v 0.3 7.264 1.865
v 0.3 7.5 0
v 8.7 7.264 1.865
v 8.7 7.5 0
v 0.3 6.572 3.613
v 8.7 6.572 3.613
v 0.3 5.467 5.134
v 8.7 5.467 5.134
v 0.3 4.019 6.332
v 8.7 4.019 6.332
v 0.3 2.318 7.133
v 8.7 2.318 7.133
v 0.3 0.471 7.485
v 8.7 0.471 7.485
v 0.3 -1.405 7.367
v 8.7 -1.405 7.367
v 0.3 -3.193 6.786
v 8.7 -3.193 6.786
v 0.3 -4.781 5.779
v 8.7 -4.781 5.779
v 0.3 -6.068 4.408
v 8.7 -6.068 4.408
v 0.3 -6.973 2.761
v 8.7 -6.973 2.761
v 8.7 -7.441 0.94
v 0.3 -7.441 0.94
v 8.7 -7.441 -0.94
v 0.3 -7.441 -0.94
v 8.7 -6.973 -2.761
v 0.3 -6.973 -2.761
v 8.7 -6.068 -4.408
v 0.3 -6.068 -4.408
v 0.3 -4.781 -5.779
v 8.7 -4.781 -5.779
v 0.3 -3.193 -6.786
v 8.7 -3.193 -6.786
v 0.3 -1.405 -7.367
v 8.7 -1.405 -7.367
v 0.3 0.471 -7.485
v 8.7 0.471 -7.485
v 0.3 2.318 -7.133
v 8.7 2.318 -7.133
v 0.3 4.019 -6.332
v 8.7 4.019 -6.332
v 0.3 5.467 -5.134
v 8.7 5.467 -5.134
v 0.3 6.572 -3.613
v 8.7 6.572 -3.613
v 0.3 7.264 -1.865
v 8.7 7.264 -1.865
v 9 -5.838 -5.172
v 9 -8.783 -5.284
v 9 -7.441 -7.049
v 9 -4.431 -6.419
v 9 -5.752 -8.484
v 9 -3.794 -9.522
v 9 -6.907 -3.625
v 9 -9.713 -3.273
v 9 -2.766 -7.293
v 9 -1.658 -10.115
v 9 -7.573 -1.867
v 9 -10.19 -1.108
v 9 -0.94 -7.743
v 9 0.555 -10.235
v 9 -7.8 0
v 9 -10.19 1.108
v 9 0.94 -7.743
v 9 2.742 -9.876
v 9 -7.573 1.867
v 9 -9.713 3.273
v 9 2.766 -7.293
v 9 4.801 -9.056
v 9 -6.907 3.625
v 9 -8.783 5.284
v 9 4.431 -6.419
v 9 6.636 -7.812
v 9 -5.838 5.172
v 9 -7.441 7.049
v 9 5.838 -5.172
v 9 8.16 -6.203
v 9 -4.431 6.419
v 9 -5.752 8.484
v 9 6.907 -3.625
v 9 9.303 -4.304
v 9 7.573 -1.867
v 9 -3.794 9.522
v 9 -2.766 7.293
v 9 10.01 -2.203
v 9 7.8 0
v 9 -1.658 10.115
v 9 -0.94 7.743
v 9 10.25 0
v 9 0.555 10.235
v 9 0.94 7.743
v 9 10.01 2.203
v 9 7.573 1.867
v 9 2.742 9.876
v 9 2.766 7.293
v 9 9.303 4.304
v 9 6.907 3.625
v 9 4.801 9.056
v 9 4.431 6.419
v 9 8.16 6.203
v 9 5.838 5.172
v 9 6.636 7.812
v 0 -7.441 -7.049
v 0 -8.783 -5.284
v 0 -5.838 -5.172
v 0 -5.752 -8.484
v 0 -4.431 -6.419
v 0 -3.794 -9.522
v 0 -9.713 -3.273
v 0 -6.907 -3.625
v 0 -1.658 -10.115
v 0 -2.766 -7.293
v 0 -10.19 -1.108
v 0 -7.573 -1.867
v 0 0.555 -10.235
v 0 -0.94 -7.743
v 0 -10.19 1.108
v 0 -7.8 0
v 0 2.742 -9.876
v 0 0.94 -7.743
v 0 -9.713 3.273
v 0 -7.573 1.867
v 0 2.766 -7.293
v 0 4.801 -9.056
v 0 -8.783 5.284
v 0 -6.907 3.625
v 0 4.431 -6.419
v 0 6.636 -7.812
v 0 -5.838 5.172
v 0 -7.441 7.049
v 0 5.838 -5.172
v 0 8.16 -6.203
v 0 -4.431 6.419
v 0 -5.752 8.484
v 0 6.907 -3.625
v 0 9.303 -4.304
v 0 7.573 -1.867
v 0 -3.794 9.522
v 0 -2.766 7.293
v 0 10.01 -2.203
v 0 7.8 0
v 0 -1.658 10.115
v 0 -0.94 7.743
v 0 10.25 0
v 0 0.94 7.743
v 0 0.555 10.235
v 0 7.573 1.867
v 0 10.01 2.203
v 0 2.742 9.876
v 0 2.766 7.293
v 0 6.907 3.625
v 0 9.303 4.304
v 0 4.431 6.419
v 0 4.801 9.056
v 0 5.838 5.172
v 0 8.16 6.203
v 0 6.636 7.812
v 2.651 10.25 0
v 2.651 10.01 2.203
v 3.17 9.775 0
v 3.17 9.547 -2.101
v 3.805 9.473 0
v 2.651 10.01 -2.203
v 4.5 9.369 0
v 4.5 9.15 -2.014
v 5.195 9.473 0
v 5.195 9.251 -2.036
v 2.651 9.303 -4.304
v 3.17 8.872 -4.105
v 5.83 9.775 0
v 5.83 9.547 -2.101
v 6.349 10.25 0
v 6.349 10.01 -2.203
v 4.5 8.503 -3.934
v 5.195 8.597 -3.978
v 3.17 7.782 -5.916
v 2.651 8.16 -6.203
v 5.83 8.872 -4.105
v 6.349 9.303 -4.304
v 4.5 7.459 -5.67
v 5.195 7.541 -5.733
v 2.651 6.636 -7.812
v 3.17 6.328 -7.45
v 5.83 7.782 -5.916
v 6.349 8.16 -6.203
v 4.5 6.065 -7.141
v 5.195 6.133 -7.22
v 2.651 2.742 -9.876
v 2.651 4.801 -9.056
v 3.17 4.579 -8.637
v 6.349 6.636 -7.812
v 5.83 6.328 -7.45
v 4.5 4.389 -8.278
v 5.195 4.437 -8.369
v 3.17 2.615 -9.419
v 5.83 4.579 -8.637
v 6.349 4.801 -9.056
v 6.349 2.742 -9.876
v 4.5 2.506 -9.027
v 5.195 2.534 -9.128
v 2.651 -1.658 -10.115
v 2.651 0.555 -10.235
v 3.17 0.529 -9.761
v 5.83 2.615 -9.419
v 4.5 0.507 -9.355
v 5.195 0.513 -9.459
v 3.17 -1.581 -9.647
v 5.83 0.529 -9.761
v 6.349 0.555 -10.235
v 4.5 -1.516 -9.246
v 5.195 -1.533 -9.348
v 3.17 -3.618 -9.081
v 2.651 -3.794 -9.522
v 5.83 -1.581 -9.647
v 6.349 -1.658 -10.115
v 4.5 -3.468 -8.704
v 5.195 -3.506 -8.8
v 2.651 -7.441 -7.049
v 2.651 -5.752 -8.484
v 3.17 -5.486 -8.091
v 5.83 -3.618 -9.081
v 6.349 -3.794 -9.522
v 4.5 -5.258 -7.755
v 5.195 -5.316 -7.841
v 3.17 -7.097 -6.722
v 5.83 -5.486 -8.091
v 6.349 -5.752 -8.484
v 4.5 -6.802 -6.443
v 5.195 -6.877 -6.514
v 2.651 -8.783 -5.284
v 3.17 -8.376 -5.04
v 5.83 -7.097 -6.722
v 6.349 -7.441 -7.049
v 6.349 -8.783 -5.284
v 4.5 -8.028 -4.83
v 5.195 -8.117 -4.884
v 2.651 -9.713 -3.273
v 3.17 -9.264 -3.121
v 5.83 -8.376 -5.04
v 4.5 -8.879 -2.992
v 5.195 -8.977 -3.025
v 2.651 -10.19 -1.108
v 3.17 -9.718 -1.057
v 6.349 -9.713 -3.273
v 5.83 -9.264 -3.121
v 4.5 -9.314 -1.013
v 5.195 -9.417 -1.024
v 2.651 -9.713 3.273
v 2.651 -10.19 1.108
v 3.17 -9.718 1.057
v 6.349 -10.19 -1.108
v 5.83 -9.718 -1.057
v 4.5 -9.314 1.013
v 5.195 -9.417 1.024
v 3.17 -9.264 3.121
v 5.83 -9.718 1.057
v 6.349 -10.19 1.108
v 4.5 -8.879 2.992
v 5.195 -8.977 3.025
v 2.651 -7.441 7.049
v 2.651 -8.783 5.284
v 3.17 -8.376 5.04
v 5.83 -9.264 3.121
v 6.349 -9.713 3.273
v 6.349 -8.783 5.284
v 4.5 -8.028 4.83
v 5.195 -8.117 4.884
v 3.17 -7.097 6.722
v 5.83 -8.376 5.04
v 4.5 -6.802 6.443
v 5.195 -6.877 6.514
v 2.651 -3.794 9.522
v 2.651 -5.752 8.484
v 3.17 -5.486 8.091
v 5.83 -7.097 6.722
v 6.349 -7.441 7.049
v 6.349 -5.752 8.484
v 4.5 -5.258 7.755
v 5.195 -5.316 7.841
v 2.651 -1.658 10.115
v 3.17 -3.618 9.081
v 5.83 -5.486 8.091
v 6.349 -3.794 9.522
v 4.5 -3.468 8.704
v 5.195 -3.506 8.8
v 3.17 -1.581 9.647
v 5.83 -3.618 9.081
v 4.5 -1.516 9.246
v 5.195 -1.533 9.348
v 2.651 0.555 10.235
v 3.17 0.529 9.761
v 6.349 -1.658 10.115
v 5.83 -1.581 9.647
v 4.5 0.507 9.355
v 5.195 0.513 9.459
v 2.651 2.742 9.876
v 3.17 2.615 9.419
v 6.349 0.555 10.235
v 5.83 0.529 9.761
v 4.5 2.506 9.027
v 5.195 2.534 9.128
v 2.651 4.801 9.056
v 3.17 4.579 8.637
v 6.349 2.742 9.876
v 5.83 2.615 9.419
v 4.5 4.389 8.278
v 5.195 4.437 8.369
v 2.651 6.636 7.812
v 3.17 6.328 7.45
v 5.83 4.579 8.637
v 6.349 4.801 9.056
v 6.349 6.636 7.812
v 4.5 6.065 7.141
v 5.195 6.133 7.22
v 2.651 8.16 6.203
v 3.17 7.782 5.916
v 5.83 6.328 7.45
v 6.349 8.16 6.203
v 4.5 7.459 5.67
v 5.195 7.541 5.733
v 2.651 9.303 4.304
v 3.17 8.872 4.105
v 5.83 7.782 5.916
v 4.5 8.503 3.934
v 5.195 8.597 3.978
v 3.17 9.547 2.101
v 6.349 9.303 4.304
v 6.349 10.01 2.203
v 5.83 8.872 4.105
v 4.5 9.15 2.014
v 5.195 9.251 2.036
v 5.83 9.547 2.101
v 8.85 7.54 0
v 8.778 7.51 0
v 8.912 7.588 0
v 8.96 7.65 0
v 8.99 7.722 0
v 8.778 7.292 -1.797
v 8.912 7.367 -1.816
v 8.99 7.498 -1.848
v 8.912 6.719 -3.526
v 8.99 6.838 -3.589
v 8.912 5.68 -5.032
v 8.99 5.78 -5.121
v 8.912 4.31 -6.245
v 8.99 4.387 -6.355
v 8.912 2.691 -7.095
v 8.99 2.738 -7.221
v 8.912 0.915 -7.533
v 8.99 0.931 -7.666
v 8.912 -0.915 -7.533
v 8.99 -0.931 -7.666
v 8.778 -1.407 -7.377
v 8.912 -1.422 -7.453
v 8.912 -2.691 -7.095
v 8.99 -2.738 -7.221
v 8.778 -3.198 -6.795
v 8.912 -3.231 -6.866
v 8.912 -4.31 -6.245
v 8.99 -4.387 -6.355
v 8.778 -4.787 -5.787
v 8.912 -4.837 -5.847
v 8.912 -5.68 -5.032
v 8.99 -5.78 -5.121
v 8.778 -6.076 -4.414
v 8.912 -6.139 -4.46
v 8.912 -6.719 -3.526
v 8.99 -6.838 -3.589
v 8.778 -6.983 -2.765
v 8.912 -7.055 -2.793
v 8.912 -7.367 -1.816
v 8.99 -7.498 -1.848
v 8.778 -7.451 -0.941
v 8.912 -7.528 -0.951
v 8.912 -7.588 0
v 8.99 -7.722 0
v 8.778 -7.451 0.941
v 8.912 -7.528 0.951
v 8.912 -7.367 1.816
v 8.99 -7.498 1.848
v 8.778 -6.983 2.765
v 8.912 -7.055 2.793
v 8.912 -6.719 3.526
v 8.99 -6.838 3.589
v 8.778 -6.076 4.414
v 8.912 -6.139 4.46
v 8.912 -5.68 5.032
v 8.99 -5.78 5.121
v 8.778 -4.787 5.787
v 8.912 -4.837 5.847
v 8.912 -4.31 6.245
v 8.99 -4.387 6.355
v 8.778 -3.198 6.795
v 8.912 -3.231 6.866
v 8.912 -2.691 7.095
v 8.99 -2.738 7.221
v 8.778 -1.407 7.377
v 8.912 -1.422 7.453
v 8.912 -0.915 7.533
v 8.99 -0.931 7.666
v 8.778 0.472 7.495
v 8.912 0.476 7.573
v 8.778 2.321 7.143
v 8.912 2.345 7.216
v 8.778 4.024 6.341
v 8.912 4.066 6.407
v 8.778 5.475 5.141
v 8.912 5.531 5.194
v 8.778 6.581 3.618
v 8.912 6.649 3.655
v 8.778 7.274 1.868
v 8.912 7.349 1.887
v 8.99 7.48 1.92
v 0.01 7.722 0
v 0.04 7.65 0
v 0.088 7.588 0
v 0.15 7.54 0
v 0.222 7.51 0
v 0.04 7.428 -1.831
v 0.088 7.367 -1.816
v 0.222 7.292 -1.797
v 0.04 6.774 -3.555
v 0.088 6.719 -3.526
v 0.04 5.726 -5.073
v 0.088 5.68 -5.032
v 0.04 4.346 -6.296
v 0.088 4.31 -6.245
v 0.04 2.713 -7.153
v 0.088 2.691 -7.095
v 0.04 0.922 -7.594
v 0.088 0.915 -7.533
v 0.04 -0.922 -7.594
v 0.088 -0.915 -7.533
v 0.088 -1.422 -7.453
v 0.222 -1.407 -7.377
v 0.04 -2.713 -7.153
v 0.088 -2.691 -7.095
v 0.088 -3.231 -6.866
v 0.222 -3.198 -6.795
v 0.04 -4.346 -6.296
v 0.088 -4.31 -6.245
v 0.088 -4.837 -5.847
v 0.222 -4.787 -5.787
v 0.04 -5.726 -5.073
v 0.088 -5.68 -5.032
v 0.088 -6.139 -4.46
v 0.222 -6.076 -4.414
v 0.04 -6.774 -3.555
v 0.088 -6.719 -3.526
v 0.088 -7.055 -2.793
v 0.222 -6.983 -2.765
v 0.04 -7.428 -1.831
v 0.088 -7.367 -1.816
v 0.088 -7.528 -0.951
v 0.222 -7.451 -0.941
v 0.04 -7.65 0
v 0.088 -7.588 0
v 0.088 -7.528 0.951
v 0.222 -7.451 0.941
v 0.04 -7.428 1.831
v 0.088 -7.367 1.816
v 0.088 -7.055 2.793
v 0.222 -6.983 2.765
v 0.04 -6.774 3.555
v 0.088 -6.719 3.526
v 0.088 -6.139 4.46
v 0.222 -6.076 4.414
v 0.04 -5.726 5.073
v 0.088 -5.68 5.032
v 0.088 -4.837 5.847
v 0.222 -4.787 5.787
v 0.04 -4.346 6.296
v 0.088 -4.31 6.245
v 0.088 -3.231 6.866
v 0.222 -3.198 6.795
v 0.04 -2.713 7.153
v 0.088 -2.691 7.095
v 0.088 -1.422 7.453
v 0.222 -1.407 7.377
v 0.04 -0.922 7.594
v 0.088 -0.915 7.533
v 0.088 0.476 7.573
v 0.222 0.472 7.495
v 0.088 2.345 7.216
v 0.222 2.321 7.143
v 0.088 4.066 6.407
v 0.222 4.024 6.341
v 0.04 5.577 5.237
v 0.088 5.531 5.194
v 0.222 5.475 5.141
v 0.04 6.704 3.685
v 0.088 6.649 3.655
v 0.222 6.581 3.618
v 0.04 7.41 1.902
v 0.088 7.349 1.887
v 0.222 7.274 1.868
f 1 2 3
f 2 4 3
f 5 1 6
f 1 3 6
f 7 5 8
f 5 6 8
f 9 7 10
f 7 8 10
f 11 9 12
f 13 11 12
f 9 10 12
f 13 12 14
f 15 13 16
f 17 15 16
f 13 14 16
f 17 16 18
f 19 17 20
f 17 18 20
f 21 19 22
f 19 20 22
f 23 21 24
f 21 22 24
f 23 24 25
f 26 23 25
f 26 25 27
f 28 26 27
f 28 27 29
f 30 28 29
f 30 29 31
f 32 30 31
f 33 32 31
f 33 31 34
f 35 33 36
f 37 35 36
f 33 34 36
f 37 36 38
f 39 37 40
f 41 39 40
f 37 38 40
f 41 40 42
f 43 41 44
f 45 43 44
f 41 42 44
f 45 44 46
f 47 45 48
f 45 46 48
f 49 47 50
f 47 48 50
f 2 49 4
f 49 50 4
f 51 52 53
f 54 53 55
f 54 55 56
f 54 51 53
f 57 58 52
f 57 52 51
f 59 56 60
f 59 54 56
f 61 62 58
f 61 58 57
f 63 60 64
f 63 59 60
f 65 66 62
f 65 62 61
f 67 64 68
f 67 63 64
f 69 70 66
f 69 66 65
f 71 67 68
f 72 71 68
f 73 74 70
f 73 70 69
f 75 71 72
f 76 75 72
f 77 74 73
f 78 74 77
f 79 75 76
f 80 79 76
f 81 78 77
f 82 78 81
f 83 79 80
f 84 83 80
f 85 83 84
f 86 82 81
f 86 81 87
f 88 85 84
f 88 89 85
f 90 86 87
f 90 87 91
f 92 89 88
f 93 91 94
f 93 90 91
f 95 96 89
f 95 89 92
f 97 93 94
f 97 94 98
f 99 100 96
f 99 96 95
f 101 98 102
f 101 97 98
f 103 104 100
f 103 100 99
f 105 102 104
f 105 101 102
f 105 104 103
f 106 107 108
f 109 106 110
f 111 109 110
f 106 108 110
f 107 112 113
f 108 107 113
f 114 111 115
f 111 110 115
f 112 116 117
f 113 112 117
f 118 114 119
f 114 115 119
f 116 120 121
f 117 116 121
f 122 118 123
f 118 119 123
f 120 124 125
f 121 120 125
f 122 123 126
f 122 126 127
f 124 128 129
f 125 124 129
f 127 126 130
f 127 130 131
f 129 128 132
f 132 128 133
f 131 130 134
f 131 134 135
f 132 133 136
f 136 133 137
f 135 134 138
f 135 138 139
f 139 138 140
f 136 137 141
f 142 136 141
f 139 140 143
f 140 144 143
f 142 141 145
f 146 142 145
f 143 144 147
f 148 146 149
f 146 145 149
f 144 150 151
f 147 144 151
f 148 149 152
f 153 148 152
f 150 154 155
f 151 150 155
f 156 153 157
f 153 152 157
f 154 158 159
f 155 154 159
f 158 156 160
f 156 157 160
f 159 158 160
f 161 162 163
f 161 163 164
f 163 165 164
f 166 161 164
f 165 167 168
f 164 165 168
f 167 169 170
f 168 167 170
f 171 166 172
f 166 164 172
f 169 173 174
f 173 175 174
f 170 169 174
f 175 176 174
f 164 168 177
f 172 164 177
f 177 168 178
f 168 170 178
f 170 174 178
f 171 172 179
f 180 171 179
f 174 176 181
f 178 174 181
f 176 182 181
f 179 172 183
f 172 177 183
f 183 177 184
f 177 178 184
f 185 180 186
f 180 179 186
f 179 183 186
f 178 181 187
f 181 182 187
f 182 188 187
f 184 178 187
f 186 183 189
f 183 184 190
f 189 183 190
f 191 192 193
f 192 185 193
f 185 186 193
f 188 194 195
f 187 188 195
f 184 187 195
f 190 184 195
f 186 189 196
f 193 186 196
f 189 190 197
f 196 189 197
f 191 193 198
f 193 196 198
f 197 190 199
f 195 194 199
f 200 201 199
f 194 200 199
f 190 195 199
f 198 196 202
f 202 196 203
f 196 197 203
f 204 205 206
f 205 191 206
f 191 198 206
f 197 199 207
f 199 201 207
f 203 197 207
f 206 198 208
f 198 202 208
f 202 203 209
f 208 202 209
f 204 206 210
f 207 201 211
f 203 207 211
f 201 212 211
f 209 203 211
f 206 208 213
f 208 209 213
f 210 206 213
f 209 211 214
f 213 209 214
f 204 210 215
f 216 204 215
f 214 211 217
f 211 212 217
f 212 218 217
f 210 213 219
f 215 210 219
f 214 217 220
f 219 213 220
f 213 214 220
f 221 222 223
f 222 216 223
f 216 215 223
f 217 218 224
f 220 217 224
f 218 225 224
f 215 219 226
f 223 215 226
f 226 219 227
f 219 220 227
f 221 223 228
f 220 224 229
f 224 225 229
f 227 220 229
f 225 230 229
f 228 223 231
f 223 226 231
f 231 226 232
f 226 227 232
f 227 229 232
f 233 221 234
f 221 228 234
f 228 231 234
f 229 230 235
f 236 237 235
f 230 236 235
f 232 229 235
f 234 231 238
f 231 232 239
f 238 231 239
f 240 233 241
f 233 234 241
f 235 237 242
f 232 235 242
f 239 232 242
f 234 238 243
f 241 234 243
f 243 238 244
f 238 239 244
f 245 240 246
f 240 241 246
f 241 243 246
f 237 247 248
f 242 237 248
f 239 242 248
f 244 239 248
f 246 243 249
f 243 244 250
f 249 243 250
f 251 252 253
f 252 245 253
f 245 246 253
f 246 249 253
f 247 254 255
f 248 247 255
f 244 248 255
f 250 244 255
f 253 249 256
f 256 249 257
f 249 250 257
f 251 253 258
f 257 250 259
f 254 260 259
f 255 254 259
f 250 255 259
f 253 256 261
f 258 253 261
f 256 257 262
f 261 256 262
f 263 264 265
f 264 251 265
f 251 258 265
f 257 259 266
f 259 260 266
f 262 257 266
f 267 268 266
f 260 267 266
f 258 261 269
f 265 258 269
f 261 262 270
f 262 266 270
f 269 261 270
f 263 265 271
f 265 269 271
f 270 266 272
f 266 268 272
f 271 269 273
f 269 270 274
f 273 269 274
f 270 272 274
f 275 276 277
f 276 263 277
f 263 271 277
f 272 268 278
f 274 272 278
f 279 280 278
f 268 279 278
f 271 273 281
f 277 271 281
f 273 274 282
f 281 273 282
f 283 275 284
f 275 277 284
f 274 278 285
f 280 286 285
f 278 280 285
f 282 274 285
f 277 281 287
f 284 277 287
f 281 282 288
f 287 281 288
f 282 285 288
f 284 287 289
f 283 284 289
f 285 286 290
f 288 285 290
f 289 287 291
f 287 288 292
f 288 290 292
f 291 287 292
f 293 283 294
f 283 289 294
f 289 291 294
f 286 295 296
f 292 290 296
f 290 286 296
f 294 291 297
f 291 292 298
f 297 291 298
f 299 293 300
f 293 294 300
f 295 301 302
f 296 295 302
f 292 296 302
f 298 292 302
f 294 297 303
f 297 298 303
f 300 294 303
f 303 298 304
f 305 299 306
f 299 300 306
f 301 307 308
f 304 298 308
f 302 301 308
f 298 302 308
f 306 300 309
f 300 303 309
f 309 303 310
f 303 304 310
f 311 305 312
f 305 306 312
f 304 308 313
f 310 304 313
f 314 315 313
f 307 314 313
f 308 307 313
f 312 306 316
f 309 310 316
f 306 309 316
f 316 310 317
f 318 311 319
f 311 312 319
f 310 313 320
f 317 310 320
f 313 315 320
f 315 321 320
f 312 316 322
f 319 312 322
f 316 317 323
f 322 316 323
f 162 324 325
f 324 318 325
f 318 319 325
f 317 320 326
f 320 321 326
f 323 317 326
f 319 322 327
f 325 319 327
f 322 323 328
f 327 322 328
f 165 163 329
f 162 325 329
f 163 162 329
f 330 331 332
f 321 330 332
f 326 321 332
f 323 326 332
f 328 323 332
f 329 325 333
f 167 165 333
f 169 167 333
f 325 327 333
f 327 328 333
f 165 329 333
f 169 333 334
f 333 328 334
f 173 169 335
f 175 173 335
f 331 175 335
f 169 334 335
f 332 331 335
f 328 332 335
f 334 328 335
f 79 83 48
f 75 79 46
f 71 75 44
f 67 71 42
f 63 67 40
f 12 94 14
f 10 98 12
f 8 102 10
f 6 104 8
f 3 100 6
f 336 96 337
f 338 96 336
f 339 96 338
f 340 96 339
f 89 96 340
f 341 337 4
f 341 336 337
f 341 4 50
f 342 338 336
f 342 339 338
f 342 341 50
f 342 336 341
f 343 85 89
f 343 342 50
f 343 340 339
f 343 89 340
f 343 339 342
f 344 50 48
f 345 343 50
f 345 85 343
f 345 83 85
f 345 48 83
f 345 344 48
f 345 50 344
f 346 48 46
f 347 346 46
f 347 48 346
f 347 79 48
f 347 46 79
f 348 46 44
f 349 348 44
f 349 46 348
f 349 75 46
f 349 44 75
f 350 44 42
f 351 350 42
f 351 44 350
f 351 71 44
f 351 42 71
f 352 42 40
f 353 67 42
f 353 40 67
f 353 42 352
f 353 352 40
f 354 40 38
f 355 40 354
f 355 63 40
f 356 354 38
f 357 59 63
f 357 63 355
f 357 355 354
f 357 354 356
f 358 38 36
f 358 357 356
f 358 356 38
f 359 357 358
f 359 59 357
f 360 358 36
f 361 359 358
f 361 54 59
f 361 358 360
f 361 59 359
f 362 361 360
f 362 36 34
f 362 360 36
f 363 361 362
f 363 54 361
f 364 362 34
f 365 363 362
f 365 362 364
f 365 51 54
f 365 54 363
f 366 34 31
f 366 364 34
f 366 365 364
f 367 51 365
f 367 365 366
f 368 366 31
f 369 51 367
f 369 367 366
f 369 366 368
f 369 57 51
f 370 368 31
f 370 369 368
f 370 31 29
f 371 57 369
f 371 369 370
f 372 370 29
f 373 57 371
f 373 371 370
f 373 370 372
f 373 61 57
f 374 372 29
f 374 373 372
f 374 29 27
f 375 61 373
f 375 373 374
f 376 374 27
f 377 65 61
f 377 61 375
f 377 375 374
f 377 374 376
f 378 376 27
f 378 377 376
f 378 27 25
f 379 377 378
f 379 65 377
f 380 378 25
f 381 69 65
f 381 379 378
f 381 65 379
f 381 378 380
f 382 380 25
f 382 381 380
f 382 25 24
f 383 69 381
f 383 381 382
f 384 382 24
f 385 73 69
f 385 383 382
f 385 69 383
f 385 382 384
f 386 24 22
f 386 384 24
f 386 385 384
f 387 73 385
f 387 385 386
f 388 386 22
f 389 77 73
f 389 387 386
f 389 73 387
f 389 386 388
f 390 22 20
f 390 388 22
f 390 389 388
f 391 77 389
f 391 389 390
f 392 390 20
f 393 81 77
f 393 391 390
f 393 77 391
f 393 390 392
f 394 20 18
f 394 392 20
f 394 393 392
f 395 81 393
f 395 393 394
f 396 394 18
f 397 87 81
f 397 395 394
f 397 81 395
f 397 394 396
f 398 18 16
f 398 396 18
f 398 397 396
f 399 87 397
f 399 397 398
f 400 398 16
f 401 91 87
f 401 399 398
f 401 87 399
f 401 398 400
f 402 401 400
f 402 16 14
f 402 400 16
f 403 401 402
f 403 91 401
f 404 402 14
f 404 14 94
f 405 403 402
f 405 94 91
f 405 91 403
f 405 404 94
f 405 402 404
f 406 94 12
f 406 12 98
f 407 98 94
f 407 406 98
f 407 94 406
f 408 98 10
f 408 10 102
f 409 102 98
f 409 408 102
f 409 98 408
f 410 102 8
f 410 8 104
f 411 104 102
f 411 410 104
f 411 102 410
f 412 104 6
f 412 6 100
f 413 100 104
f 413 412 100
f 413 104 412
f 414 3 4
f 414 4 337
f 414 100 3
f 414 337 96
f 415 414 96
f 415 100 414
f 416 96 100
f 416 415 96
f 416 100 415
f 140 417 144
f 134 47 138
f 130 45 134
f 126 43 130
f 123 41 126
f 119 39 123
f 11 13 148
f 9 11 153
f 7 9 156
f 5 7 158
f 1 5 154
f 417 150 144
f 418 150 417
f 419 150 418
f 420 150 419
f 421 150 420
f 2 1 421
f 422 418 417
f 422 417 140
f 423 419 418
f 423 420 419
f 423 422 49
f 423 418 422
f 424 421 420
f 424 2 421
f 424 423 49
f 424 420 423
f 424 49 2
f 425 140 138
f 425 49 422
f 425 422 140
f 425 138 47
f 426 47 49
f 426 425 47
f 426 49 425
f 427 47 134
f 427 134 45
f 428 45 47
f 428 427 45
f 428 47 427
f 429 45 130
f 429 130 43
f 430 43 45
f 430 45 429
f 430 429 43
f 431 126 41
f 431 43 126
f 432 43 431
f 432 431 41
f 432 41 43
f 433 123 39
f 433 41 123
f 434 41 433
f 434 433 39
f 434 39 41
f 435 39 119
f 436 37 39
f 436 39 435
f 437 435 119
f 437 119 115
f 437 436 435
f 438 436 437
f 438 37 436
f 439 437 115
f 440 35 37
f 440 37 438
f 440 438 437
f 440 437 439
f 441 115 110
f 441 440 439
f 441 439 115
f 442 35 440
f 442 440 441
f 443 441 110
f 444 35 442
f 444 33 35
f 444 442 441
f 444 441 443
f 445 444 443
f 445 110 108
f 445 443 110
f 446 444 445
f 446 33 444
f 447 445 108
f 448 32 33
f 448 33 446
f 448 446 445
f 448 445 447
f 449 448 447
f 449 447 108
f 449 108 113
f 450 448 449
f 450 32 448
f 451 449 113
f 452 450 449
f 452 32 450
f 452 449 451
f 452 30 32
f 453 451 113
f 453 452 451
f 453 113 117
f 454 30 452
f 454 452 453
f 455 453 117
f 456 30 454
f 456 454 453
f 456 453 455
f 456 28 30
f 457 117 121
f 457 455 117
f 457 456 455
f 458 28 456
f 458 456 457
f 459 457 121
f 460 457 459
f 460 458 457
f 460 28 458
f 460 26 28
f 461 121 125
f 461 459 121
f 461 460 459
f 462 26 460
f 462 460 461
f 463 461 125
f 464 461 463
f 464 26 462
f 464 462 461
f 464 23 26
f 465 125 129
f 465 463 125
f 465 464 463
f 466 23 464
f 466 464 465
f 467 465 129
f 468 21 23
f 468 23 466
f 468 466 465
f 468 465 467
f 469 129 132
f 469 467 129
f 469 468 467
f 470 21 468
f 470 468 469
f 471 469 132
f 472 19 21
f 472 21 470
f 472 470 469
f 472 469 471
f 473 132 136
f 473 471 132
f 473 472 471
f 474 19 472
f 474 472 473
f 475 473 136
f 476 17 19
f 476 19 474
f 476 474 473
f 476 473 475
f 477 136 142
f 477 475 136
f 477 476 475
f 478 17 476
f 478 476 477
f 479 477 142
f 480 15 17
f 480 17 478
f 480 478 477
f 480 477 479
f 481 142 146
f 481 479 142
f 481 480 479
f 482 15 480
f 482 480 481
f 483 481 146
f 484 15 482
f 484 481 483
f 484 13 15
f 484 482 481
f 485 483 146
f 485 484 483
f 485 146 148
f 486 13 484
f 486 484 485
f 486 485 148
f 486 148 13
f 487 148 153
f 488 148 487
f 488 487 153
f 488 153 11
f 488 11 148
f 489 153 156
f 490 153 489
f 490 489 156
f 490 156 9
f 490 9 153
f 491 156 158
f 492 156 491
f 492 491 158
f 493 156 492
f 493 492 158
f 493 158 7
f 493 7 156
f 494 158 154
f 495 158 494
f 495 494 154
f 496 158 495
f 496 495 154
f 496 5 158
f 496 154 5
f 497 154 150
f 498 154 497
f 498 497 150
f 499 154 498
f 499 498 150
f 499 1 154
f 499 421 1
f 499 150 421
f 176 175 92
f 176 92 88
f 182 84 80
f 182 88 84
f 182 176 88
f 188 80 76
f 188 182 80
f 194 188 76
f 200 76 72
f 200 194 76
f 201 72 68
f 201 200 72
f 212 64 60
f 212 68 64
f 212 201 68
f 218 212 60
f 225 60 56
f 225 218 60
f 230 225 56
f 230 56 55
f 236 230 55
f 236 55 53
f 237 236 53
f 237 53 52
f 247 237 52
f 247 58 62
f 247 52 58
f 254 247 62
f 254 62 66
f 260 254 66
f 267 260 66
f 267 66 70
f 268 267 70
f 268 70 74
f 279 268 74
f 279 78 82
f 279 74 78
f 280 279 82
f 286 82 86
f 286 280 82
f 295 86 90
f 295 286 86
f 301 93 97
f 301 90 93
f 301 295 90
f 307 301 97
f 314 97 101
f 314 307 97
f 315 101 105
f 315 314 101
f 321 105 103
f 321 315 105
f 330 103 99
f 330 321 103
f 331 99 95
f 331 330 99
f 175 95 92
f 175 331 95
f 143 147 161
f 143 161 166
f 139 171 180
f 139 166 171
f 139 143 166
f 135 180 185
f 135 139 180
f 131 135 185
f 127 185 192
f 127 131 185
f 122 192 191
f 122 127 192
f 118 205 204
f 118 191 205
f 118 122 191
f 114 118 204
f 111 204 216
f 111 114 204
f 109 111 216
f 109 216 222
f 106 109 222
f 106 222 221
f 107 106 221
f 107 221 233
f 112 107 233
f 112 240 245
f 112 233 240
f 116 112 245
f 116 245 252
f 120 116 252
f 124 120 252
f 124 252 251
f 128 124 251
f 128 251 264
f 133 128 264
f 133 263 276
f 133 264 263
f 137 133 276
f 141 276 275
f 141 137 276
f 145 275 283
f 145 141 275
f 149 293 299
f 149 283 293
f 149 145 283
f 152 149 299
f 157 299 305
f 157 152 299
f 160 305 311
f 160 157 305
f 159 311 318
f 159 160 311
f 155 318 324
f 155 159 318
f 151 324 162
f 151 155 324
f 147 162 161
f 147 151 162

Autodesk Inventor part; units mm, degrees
ref_plane "YZ Plane" through (0, 0, 0) normal (1, 0, 0) x (0, 1, 0)
ref_plane "XZ Plane" through (0, 0, 0) normal (0, 1, 0) x (-1, 0, 0)
ref_plane "XY Plane" through (0, 0, 0) normal (0, 0, 1) x (1, 0, 0)
sketch "Sketch_1" plane through (0, 0, 0) normal (0, 0, 1) x (1, 0, 0)
  line L0 (50, 0) -> (-50, 0)
  arc A0 (0, 7.8) -> (0.3, 7.5) centre (0.3, 7.8) ccw
  line L1 (0.3, 7.5) -> (8.7, 7.5)
  arc A1 (8.7, 7.5) -> (9, 7.8) centre (8.7, 7.8) ccw
  line L2 (9, 7.8) -> (9, 10.25)
  line L3 (9, 10.25) -> (6.3491, 10.25)
  arc A2 (2.6509, 10.25) -> (6.3491, 10.25) centre (4.5, 11.75) ccw
  line L4 (2.6509, 10.25) -> (0, 10.25)
  line L5 (0, 10.25) -> (0, 7.8)
revolve "Revolution1" add sketch "Sketch_1" angle 360 about axis through (50, 0, 0) along (1, 0, 0)
properties part number "6002_PART1"
